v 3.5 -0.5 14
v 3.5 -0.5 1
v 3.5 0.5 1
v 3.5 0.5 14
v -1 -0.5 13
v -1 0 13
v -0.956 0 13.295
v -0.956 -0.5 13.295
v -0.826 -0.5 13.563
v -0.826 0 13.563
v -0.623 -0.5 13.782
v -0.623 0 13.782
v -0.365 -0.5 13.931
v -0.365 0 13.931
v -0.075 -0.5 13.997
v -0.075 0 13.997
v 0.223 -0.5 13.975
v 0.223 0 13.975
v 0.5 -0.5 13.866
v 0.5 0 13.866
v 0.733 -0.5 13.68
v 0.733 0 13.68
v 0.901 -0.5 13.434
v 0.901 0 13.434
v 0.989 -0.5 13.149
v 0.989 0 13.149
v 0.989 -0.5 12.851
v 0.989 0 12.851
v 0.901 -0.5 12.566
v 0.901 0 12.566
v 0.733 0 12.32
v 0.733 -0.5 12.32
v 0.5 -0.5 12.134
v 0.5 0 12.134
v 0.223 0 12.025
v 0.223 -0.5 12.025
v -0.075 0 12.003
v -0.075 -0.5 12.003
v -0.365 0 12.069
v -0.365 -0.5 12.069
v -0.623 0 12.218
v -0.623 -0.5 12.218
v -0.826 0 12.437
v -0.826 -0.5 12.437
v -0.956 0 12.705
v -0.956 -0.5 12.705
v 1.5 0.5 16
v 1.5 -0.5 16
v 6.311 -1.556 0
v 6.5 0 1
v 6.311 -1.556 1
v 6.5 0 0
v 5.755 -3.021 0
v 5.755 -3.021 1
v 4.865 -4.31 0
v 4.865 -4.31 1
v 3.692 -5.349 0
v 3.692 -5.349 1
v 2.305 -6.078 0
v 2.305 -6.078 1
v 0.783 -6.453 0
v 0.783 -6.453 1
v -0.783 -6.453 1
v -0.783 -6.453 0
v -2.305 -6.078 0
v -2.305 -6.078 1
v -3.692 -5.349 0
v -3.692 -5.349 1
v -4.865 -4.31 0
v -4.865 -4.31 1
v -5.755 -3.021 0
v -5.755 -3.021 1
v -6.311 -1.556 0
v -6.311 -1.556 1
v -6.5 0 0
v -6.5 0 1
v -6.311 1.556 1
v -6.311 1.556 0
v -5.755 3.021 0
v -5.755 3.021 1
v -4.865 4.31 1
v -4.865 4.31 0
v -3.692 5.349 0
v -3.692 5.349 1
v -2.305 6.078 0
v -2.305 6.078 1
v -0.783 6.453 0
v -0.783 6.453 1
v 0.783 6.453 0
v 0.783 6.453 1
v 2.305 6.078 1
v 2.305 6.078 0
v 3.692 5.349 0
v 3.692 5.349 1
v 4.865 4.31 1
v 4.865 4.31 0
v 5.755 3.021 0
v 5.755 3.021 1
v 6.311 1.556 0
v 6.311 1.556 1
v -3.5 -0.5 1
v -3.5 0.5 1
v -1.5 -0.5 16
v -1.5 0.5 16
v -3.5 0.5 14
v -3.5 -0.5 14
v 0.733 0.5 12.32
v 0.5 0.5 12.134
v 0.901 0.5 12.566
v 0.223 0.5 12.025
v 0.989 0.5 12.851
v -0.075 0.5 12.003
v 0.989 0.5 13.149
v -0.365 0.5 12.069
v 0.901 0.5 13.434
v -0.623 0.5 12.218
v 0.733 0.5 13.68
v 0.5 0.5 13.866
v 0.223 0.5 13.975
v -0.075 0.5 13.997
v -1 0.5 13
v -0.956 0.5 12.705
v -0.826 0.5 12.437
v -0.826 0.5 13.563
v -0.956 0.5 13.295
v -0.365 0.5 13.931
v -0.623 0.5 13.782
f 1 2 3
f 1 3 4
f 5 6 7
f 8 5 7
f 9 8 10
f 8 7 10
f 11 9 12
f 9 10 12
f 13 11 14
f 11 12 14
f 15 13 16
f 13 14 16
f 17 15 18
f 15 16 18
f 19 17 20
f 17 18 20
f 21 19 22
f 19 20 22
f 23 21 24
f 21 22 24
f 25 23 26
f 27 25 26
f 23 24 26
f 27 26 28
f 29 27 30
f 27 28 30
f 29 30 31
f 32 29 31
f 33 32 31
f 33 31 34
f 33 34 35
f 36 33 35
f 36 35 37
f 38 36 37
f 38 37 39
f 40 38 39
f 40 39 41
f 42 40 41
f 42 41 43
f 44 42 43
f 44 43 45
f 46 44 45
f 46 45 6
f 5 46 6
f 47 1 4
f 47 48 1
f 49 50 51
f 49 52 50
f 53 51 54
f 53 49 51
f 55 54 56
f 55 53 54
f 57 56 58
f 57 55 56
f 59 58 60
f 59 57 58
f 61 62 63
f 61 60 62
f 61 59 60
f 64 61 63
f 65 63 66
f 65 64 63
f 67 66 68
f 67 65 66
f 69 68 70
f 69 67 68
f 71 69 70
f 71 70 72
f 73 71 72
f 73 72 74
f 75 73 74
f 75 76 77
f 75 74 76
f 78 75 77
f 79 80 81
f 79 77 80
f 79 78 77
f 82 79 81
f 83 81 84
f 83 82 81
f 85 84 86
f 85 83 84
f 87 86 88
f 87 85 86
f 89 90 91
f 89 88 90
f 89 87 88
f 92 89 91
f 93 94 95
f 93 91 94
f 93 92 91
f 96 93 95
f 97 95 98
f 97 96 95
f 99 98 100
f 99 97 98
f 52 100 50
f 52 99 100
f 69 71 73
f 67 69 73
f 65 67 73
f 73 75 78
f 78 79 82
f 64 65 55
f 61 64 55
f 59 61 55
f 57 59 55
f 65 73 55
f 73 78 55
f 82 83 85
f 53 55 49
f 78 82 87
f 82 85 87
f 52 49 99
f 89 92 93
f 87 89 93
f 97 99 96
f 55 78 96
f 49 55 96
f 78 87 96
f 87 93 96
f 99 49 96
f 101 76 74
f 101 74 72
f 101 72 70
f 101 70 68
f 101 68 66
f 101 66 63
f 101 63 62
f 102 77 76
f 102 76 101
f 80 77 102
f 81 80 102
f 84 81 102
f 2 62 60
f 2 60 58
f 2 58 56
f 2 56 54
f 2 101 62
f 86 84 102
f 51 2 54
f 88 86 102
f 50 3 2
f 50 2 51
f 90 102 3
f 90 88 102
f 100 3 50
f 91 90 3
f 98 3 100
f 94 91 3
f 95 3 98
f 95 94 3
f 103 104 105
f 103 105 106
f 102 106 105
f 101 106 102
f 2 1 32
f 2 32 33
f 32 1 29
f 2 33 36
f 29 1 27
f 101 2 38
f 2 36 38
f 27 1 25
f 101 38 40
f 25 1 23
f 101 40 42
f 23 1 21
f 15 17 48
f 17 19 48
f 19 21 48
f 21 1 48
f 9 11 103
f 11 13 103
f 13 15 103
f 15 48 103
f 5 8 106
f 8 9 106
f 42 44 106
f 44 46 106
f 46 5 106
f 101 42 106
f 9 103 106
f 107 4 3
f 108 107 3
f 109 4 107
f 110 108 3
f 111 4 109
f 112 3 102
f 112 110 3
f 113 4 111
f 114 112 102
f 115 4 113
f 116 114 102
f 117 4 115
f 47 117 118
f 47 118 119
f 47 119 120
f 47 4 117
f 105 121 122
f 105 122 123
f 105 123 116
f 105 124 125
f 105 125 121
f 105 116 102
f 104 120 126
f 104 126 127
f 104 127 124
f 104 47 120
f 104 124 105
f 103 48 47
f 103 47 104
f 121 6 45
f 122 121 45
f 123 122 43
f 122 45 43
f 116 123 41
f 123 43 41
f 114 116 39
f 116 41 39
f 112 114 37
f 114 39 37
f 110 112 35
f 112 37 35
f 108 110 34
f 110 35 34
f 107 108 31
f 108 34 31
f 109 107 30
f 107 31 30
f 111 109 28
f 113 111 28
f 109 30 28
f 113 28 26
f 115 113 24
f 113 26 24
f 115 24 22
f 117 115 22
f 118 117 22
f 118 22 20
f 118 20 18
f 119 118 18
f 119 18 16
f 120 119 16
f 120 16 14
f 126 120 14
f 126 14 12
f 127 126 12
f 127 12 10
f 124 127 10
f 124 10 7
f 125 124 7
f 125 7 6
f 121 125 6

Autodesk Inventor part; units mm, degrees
ref_plane "YZ Plane" through (0, 0, 0) normal (1, 0, 0) x (0, 1, 0)
ref_plane "XZ Plane" through (0, 0, 0) normal (0, 1, 0) x (-1, 0, 0)
ref_plane "XY Plane" through (0, 0, 0) normal (0, 0, 1) x (1, 0, 0)
sketch "Skizze1" plane through (0, 0, 0) normal (0, 0, 1) x (1, 0, 0)
  circle A0 centre (0, 0) radius 6.5
  dimension "d11" = 13
extrude "Extrusion1" add sketch "Skizze1" along normal blind 1
sketch "Skizze2" plane through (0, 0, 0) normal (0, 1, 0) x (-1, 0, 0)
  line L0 (6.5, 1) -> (-6.5, 1) projected
  line L1 (3.5, 1) -> (-3.5, 1)
  line L2 (-3.5, 1) -> (-3.5, 16)
  line L3 (-3.5, 16) -> (3.5, 16)
  line L4 (3.5, 16) -> (3.5, 1)
  line L5 (0, -1) -> (0, 20) projected
  circle A0 centre (0, 13) radius 1
  line L6 (6.5, 0) -> (-6.5, 0) projected
  point P0 (-3.5, 1)
  dimension "d2" = 15
  dimension "d3" = 7
  dimension "d4" = 2
  dimension "d5" = 3
  dimension "d12" = 13
extrude "Extrusion2" add sketch "Skizze2" along normal mid plane 1 contours L0 L5 A0 L3 L4 | L0 L2 L3 L5 A0
chamfer "Fase1" distance 2 angle 45 2 edges at (3.5, 0, 16) (-3.5, 0, 16)
properties part number "Deckel"
